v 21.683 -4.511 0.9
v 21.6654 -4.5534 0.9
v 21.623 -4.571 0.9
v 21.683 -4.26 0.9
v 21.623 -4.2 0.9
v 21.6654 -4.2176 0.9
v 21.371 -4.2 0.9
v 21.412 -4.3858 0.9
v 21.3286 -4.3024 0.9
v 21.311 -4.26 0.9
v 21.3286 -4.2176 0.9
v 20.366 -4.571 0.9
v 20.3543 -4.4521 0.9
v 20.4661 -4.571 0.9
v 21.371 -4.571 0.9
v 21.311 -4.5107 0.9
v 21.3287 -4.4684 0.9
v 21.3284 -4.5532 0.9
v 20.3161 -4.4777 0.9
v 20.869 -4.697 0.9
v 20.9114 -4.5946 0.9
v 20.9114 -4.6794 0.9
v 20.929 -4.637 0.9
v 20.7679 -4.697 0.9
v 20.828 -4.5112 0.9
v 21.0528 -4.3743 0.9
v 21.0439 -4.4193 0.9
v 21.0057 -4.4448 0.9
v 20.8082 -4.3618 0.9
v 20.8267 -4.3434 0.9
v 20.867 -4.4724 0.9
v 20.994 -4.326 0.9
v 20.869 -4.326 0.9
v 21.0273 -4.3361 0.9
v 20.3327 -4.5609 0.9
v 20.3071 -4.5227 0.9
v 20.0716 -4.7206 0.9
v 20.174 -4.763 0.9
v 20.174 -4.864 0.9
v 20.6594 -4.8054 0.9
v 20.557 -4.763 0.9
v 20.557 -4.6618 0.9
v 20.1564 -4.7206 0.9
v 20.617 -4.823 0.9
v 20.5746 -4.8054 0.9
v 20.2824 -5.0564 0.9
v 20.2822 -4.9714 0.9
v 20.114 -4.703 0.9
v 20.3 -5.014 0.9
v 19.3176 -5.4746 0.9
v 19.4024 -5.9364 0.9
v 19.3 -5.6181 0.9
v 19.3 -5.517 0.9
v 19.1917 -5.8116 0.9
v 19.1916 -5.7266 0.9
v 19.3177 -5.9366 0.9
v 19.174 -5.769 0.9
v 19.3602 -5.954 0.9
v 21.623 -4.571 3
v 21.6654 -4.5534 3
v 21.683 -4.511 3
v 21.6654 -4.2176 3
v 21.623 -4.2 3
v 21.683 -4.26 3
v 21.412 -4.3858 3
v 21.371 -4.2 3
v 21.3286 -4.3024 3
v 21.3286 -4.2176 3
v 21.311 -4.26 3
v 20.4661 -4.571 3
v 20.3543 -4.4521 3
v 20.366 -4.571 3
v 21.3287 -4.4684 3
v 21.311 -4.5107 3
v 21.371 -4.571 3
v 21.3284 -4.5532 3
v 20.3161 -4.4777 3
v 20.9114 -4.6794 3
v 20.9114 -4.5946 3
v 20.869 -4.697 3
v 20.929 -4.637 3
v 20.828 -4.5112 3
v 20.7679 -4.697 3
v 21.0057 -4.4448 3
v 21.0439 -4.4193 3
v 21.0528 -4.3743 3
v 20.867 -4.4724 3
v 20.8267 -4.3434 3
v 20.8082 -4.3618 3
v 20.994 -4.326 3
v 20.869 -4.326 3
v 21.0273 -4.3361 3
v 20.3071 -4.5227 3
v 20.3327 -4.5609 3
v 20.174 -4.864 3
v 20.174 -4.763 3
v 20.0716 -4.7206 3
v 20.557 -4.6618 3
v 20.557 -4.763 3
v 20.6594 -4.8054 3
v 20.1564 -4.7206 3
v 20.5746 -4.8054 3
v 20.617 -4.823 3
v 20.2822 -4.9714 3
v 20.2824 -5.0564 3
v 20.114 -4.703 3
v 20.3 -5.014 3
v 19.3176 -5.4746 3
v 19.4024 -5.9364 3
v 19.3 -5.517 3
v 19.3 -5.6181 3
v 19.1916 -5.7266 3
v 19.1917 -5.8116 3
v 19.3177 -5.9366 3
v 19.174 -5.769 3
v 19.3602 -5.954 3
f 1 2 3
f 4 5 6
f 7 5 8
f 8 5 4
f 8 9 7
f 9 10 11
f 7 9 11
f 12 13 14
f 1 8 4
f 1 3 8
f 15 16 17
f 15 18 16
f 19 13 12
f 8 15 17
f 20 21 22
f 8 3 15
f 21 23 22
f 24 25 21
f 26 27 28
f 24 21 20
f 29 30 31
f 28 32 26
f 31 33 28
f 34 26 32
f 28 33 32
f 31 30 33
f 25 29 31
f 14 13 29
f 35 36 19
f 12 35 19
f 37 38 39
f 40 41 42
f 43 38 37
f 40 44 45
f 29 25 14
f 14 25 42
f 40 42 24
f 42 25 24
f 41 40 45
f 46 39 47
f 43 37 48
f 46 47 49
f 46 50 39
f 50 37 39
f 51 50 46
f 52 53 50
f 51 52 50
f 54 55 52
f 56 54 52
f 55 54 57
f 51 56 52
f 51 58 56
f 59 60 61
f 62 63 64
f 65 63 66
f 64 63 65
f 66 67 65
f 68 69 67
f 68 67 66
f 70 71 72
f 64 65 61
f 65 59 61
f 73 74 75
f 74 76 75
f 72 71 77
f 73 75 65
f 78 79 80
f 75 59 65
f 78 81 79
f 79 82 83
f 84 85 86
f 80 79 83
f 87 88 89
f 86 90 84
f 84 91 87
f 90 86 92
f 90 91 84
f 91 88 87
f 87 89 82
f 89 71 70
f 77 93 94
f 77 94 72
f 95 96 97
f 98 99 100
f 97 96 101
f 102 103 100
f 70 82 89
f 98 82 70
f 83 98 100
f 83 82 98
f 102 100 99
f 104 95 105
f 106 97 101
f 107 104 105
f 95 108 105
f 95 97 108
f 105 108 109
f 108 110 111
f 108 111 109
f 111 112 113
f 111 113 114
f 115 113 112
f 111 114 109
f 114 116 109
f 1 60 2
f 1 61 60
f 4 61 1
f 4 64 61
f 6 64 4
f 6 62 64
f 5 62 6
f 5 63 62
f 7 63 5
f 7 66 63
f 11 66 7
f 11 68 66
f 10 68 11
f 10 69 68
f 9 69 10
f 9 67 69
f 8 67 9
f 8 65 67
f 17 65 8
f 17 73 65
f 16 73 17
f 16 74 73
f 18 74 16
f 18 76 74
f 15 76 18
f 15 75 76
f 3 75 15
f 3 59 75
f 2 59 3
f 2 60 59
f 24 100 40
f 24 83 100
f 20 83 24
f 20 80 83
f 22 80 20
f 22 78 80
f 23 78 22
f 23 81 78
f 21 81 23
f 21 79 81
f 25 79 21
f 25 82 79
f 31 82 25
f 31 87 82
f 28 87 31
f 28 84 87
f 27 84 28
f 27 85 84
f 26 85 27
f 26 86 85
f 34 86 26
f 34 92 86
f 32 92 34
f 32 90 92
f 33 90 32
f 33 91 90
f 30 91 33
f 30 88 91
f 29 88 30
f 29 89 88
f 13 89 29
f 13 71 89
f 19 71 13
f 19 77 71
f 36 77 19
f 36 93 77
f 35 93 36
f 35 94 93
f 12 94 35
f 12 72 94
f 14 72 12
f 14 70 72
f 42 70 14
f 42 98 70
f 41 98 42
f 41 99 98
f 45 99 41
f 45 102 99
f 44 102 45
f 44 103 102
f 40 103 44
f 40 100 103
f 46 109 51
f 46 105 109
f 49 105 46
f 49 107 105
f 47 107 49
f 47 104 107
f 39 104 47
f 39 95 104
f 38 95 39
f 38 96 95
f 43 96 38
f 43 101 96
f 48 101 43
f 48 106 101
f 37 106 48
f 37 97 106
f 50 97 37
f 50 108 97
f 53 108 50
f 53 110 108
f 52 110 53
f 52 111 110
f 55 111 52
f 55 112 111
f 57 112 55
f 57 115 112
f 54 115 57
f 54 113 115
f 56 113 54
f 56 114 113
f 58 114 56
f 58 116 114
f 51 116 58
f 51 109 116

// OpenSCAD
$fn = 24;
translate([0, -2.500, 0.900])
  linear_extrude(height=2.100) {
offset(r=0.06, $fn=8) {
    polygon(points=[[21.623,-1.760],[21.120,-1.760],[20.994,-1.886],[20.366,-2.011],[19.360,-3.017],[19.360,-3.143],[19.234,-3.269],[19.360,-3.394],[20.240,-2.514],[20.114,-2.389],[20.114,-2.263],[20.366,-2.011],[20.491,-2.011],[20.617,-2.137],[20.617,-2.263],[20.491,-2.389],[20.743,-2.137],[20.994,-2.137],[20.869,-2.137],[20.743,-2.011],[20.869,-1.886],[20.994,-1.886],[21.120,-1.760],[21.371,-1.760],[21.497,-1.886],[21.371,-2.011],[21.246,-2.011],[21.623,-2.011]], paths=[[0,1,2,3,4,5,6,7,8,9,10,11,12,13,14,15,16,17,18,19,20,21,22,23,24,25,26,27]]);
}
}
